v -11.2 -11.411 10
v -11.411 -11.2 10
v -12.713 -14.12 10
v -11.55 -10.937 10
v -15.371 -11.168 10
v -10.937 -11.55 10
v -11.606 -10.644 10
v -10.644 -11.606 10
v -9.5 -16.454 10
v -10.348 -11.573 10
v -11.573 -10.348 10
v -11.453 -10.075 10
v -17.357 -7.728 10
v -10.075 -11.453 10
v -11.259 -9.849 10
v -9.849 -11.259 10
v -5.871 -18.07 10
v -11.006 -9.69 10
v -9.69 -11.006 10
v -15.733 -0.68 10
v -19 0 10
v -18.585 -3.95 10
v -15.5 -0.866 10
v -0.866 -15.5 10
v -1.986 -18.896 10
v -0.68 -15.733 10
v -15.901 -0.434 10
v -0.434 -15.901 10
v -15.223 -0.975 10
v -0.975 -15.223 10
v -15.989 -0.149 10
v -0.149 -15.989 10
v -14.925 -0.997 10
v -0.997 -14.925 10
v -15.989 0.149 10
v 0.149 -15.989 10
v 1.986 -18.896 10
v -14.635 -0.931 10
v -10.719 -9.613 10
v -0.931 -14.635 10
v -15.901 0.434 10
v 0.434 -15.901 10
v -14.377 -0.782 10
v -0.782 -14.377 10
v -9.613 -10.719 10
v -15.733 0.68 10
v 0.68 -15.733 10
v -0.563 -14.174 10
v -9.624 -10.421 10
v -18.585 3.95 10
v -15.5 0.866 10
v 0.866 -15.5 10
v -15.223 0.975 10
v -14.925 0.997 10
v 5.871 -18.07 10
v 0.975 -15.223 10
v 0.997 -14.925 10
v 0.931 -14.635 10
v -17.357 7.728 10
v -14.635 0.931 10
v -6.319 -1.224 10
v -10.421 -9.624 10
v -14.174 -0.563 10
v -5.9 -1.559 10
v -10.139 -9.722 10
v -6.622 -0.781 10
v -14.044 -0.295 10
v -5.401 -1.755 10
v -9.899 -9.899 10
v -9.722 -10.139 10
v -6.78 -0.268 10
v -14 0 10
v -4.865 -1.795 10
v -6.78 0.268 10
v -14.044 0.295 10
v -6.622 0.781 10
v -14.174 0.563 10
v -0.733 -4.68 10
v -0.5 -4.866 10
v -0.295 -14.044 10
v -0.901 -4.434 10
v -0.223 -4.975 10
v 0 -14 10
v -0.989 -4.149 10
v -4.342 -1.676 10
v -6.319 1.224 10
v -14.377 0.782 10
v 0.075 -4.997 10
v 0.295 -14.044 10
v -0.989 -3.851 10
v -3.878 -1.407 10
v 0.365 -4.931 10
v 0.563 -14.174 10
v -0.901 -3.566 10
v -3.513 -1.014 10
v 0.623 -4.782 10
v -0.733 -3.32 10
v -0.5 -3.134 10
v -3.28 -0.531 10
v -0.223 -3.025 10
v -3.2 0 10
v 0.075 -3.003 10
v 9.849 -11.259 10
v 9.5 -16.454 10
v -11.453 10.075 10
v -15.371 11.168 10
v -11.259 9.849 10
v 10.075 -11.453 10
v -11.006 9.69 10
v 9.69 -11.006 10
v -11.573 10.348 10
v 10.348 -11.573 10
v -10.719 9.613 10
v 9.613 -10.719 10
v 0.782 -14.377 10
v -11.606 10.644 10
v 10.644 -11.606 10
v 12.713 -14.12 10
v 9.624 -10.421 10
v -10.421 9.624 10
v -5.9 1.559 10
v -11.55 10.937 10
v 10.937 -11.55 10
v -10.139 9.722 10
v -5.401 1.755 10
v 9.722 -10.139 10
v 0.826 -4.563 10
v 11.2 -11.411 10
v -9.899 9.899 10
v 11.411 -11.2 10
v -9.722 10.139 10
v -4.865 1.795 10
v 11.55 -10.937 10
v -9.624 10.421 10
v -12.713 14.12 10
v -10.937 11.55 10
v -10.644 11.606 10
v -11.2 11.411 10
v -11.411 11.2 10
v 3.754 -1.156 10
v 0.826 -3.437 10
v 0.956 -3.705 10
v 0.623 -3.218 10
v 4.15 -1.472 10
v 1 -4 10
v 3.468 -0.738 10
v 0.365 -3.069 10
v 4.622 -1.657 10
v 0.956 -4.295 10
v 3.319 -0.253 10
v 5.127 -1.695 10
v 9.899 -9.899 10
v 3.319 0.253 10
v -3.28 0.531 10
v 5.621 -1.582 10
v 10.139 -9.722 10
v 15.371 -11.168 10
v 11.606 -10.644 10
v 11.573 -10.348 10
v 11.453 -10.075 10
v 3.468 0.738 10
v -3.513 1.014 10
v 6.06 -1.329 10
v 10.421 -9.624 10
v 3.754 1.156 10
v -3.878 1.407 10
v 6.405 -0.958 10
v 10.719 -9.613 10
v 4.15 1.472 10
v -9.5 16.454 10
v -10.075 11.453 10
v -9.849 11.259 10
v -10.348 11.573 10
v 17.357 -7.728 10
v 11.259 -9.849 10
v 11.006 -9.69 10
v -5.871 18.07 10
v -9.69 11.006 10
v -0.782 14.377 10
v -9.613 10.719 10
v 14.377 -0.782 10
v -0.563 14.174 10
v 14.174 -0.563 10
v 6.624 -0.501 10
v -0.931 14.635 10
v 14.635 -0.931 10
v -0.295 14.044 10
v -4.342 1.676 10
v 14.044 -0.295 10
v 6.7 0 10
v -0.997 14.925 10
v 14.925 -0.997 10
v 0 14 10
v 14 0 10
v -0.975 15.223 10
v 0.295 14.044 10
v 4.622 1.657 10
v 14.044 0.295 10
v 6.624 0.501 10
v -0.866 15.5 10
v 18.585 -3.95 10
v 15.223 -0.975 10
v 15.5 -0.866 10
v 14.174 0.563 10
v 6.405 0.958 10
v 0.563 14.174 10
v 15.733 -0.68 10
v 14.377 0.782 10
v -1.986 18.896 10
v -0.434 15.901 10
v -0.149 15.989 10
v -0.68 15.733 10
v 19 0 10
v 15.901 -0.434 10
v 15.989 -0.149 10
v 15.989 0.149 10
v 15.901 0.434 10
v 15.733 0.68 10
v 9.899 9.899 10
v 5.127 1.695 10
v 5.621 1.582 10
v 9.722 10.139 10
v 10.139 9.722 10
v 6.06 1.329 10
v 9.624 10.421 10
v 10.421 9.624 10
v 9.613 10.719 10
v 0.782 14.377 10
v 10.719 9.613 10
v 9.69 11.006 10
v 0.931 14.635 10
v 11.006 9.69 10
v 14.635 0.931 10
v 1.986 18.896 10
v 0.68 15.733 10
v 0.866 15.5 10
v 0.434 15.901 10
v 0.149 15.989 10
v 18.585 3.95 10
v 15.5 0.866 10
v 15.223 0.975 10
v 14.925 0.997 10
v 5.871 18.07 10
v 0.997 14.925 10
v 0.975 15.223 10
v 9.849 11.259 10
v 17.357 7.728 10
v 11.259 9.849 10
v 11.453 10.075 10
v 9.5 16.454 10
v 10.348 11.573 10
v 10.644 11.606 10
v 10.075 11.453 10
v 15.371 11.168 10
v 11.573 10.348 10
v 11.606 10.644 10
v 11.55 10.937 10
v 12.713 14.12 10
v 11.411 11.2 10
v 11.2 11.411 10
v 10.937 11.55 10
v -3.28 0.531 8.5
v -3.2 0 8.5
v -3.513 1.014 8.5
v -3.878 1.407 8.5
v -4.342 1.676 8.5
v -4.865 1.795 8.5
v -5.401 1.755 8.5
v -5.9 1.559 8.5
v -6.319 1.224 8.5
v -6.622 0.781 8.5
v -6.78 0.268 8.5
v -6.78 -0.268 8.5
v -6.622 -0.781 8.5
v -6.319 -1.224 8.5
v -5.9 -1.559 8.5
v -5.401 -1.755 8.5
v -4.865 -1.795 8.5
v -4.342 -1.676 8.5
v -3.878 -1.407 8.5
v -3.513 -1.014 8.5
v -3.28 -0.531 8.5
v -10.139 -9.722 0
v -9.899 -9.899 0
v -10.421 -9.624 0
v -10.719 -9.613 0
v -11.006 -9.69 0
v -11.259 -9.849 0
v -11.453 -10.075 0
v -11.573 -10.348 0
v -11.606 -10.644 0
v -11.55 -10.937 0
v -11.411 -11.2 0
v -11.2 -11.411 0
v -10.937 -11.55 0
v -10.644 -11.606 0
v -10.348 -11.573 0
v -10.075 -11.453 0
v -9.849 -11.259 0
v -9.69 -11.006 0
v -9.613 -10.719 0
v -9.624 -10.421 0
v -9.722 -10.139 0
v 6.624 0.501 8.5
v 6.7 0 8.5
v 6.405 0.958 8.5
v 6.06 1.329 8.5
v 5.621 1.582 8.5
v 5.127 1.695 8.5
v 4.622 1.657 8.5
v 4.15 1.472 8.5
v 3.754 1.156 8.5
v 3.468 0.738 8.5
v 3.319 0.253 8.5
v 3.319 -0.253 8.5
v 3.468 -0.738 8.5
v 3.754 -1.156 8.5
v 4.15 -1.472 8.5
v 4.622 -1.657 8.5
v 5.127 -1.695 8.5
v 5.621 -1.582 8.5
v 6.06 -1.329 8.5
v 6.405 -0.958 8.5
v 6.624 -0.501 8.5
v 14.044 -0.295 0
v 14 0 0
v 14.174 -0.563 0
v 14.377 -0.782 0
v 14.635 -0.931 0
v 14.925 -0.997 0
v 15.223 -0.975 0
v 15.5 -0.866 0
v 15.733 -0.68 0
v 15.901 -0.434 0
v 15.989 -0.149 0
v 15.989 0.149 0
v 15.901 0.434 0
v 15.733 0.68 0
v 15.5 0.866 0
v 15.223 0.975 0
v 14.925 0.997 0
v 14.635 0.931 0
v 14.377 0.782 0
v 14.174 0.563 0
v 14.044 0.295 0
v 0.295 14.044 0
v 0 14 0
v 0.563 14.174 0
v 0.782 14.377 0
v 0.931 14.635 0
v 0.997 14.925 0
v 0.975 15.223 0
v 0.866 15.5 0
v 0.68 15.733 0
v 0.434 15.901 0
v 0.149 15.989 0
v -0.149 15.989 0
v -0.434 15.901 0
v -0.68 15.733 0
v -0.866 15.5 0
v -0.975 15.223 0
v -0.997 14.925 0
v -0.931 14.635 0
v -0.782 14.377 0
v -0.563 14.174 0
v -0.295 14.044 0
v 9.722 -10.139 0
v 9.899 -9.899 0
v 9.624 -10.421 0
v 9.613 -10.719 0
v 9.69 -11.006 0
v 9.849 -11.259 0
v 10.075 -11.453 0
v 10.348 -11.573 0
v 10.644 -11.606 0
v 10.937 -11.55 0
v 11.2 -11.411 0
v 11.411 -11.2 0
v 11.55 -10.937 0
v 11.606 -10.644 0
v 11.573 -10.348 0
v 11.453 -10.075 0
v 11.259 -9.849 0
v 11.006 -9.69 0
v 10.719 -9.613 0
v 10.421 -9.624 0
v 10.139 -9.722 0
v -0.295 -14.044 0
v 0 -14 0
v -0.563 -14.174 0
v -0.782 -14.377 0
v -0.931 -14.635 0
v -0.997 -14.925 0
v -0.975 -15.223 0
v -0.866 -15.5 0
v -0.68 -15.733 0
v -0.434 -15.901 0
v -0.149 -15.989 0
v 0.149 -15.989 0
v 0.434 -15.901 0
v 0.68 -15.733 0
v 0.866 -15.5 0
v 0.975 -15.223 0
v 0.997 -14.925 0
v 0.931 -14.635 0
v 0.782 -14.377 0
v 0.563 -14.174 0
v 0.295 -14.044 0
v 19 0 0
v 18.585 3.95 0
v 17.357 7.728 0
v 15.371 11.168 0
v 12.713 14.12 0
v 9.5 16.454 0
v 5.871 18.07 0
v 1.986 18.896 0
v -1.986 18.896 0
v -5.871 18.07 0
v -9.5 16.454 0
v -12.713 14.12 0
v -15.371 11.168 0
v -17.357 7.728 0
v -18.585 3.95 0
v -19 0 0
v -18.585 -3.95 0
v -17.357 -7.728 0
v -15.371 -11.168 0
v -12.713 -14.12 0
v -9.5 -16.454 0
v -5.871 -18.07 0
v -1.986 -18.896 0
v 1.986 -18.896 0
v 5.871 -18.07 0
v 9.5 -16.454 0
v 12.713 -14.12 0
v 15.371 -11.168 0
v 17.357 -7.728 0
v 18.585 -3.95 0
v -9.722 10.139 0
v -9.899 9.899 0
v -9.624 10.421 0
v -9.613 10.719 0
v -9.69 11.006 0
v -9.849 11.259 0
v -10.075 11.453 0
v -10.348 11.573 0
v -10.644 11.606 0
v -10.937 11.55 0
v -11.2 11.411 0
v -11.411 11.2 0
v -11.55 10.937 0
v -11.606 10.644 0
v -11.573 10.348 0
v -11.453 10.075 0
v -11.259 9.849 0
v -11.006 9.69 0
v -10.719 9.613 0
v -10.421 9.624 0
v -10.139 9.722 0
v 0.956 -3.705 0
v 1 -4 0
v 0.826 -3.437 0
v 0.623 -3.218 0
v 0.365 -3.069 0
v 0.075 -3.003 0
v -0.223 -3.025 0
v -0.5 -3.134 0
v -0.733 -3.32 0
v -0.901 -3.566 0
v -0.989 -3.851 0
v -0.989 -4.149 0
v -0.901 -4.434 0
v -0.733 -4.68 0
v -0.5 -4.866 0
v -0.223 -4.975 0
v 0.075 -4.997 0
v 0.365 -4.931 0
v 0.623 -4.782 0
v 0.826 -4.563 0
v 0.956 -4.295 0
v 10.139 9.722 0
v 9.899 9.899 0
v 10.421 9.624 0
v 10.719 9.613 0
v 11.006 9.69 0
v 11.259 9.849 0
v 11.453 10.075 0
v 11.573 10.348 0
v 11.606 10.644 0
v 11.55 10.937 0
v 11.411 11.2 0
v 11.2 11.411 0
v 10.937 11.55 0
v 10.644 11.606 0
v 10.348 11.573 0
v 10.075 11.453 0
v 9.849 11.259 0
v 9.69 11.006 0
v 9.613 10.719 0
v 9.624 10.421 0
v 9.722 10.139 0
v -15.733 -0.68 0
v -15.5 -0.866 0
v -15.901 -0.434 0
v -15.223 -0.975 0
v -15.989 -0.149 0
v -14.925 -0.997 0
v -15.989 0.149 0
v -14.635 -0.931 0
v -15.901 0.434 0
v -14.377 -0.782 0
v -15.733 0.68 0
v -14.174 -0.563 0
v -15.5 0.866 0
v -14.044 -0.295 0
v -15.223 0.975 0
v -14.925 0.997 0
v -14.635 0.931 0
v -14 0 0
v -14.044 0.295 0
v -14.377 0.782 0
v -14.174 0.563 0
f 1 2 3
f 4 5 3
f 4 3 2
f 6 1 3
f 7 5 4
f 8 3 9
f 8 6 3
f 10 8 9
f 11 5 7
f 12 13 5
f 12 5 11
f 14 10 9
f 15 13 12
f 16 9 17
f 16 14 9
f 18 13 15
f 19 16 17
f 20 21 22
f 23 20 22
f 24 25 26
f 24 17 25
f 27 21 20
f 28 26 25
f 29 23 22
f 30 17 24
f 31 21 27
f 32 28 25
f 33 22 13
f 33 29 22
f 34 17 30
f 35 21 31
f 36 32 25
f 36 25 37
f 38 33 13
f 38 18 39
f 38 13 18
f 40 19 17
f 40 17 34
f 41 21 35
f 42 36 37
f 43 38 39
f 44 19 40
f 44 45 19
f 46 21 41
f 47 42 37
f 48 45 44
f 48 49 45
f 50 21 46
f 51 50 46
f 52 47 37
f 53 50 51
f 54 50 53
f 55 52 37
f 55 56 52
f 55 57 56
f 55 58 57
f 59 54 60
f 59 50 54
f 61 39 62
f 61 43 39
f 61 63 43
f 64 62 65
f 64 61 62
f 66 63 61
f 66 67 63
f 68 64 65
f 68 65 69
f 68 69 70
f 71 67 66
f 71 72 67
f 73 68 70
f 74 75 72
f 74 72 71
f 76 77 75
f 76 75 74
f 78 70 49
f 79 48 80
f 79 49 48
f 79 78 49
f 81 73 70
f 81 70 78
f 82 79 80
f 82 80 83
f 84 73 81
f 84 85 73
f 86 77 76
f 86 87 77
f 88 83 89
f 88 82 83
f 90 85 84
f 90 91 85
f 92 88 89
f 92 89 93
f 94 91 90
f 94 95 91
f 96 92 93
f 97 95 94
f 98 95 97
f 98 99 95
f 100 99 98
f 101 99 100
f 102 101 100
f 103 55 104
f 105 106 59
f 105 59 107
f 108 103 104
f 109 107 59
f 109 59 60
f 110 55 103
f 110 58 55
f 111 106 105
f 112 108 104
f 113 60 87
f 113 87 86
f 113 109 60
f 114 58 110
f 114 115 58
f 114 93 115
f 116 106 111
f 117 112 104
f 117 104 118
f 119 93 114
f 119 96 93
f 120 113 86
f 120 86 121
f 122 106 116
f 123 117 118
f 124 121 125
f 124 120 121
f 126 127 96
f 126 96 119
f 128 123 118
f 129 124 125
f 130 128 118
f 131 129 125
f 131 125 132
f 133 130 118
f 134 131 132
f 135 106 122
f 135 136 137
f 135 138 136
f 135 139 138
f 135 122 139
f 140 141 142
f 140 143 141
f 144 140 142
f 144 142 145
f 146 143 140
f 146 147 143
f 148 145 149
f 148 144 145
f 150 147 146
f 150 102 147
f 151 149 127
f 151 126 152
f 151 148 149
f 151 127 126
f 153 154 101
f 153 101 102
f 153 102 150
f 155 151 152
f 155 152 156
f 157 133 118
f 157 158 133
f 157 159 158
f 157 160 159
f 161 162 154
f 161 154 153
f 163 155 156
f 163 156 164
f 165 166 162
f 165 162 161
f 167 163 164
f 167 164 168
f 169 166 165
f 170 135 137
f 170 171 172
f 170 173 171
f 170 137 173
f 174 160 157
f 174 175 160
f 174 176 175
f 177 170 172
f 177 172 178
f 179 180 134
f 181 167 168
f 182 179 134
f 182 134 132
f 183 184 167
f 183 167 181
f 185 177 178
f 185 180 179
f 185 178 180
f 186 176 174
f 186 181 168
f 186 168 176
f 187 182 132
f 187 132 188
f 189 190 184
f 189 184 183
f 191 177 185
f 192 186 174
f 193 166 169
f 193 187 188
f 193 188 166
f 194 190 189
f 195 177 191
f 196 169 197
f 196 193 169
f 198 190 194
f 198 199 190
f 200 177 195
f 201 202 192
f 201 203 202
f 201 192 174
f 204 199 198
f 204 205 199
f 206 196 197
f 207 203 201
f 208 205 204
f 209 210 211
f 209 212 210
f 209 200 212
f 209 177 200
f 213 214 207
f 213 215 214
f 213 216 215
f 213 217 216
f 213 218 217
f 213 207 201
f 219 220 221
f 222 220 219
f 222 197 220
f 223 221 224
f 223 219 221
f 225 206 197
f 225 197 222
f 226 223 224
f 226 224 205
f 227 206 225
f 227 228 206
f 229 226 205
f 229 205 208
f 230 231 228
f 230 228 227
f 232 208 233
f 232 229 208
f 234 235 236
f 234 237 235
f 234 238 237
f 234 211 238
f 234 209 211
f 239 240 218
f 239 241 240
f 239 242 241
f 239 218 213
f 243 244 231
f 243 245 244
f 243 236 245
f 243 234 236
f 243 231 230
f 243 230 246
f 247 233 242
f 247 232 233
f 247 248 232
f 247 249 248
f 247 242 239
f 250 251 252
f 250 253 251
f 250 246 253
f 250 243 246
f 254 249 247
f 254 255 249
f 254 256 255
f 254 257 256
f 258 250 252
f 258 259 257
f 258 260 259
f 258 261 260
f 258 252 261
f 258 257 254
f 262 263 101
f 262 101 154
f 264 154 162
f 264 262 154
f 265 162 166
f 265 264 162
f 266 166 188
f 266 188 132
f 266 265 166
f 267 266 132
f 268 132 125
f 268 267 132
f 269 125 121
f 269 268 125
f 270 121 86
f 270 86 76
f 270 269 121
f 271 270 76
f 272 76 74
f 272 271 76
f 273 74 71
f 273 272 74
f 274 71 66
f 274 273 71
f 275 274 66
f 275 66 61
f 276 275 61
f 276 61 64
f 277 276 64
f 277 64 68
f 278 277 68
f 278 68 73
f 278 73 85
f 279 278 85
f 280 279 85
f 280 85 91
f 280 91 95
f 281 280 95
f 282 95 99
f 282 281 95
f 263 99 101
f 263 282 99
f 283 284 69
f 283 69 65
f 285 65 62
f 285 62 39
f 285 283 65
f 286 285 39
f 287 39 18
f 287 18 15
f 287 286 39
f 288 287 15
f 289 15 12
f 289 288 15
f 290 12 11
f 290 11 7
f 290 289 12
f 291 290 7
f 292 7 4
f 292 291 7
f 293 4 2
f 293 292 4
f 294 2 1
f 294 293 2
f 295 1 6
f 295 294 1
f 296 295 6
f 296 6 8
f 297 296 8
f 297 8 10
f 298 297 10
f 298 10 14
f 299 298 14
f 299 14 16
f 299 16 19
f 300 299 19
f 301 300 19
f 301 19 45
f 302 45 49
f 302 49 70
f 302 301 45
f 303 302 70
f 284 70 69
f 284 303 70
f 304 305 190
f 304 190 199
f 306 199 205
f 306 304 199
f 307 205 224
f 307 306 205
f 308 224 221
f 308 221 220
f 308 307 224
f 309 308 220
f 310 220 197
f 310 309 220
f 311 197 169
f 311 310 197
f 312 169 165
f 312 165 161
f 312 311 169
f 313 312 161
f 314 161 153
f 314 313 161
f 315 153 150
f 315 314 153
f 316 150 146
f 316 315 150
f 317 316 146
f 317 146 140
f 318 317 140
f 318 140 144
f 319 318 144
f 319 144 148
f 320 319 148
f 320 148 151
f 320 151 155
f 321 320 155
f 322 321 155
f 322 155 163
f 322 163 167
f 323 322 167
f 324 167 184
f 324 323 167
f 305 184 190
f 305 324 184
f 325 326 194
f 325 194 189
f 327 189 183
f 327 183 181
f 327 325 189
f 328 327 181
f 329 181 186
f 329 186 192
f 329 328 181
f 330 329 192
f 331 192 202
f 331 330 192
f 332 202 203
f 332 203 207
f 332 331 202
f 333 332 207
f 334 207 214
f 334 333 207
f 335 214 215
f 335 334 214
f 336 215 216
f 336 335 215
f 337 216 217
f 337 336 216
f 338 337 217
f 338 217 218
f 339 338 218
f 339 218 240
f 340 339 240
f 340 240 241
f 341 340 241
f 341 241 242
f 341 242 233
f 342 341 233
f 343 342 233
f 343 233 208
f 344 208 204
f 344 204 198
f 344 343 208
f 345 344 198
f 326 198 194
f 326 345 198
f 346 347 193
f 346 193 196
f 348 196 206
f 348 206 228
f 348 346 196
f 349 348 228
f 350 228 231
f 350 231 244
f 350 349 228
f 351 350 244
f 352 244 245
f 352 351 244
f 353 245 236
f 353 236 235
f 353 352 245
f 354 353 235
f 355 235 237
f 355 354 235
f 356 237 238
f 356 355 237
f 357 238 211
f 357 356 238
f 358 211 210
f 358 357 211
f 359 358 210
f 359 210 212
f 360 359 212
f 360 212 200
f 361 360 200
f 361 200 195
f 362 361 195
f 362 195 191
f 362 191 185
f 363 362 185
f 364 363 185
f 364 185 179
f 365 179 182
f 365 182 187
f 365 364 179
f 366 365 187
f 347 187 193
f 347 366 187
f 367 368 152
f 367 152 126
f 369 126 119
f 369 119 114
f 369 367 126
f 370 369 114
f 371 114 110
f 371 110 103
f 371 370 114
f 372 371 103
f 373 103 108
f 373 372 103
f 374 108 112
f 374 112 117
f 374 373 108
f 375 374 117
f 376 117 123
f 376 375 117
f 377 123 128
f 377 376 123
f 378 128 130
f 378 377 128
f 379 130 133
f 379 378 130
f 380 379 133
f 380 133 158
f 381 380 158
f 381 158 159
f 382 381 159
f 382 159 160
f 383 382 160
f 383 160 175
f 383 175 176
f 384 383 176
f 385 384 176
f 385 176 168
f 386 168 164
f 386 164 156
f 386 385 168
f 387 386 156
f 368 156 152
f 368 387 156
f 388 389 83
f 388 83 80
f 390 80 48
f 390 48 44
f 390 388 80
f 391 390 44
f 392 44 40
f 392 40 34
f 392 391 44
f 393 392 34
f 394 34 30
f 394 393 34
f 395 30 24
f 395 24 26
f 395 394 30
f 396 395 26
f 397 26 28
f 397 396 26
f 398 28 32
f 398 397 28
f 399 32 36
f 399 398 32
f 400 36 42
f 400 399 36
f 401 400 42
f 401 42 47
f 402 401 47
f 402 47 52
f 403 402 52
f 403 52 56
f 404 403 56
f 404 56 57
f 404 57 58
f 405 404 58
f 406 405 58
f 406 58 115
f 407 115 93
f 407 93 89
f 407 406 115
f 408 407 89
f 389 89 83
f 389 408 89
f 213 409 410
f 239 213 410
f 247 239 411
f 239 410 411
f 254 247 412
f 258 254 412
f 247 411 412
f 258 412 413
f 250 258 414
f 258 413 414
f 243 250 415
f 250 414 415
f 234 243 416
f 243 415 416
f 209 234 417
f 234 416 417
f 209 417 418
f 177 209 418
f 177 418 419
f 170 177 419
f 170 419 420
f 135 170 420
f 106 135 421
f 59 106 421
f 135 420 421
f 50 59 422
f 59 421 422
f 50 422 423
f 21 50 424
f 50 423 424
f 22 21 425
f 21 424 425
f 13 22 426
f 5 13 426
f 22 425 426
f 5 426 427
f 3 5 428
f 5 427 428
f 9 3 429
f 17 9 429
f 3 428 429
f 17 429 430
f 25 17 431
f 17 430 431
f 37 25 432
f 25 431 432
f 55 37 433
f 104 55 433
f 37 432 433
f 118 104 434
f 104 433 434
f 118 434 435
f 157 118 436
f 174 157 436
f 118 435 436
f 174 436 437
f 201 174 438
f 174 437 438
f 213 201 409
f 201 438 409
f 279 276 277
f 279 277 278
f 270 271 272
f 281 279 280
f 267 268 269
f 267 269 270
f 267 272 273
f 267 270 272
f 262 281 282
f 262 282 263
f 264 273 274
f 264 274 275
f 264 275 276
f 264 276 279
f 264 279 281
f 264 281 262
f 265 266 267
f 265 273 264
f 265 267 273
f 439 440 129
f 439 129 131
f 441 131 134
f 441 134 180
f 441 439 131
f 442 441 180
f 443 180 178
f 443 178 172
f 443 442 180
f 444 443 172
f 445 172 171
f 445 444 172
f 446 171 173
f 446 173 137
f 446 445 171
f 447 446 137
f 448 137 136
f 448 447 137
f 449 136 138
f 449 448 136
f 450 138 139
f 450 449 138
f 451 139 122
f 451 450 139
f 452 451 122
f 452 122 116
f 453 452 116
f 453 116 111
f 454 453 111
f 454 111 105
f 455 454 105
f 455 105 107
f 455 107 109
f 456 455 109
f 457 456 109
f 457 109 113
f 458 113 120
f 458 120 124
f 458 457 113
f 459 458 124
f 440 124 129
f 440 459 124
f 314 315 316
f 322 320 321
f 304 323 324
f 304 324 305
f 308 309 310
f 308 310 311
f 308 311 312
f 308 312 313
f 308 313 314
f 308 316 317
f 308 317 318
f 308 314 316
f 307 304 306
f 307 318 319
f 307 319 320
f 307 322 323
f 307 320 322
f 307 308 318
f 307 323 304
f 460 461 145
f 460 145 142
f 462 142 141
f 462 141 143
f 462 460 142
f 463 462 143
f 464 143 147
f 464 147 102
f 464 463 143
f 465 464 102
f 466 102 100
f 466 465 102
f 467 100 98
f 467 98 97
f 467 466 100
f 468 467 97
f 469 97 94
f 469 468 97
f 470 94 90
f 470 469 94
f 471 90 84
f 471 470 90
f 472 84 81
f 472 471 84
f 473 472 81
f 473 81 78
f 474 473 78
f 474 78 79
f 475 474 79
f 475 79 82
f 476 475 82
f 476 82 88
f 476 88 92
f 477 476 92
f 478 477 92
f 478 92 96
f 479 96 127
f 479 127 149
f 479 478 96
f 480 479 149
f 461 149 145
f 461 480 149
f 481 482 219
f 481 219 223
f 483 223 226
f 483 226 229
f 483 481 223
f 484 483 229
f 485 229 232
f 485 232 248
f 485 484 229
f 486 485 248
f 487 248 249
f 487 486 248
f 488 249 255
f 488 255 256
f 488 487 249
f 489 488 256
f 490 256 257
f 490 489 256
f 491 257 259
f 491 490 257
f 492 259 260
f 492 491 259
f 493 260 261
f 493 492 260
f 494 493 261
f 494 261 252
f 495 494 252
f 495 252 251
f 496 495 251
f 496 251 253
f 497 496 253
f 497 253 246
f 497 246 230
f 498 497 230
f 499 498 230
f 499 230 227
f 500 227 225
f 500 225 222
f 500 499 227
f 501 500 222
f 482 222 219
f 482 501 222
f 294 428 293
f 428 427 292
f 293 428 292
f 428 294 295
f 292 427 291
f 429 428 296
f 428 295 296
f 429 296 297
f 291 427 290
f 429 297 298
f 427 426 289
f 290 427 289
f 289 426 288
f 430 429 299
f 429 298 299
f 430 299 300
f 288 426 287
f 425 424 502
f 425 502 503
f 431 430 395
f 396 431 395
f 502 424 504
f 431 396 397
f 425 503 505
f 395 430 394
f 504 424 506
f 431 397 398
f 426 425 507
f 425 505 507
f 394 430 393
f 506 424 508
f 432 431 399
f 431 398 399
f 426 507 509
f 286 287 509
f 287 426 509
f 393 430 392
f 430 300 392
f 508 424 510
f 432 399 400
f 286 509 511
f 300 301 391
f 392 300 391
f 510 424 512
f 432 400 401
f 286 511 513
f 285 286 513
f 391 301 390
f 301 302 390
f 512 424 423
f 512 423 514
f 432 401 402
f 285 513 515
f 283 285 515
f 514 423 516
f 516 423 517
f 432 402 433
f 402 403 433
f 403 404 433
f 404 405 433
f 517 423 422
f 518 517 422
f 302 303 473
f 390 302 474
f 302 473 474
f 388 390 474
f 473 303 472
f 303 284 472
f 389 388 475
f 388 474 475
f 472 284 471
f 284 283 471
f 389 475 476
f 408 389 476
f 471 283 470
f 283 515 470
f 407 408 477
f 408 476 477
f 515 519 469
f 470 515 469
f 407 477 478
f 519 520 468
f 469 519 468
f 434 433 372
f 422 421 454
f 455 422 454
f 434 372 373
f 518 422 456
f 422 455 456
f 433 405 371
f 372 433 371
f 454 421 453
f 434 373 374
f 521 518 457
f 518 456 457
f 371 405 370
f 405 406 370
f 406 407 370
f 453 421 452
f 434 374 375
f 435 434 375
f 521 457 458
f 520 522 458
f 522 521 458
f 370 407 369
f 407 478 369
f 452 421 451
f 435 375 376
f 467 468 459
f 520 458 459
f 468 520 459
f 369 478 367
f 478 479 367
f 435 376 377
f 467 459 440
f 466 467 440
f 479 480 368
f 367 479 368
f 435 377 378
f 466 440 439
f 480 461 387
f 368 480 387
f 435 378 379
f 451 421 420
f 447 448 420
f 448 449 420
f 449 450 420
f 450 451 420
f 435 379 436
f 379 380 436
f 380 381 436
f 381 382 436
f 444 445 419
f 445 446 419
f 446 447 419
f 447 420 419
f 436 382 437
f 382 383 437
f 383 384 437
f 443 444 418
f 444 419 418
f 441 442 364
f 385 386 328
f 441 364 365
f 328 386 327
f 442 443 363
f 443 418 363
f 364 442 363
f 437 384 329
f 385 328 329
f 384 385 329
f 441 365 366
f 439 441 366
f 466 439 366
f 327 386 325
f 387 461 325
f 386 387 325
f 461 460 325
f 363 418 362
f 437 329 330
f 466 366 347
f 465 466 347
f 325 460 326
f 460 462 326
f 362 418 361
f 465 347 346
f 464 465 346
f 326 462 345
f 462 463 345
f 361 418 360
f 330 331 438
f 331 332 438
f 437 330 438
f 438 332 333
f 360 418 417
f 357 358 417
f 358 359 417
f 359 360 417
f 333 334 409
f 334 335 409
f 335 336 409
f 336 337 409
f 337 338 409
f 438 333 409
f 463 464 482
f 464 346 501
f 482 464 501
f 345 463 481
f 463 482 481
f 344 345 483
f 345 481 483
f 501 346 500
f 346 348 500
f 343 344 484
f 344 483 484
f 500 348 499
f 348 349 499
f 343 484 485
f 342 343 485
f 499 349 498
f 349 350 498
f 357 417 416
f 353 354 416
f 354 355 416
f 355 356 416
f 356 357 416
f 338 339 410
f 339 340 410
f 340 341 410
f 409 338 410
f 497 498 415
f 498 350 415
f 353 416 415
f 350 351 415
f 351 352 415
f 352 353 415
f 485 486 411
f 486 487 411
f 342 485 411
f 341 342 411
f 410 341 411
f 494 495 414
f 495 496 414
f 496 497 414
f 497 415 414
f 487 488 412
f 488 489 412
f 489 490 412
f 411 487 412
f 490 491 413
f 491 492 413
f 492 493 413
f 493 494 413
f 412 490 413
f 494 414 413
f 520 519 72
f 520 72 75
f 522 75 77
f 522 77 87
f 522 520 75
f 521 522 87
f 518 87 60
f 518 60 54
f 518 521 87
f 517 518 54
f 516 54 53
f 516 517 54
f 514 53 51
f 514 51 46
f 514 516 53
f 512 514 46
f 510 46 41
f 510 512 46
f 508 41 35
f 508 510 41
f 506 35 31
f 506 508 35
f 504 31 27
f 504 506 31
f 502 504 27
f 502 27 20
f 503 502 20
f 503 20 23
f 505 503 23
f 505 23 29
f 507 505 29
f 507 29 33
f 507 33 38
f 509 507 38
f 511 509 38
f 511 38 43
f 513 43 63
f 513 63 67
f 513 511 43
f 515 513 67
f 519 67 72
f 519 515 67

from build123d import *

# Parameters (mm, degrees)
CYLINDER003_R     = 1
CYLINDER003_DEPTH = 10
ARRAY_COUNT       = 8
CYLINDER002_R     = 1.8
CYLINDER002_DEPTH = 1.5
CYLINDER001_R     = 1.7
CYLINDER001_DEPTH = 1.5
CYLINDER004_R     = 1
CYLINDER004_DEPTH = 10
CYLINDER_R        = 19
CYLINDER_DEPTH    = 10


with BuildPart() as array:
    # Cylinder003 → Cylinder003 (new body)
    with BuildSketch(Plane(origin=(-15, 0, 0), x_dir=(1, 0, 0), z_dir=(0, 0, 1))):
        Circle(CYLINDER003_R)
    extrude(amount=CYLINDER003_DEPTH)

    # Array: Array ×8 about axis
    array_axis = Axis((0, 0, 0), (0, 0, 1))


with BuildPart() as array_1:
    add(array.part)
    for i in range(1, ARRAY_COUNT):
        add(array.part.rotate(array_axis, i * 360 / ARRAY_COUNT))


with BuildPart() as recess1:
    # Cylinder002 → Cylinder002 (new body)
    with BuildSketch(Plane(origin=(-5, 0, 8.5), x_dir=(1, 0, 0), z_dir=(0, 0, 1))):
        Circle(CYLINDER002_R)
    extrude(amount=CYLINDER002_DEPTH)


with BuildPart() as recess2:
    # Cylinder001 → Cylinder001 (new body)
    with BuildSketch(Plane(origin=(5, 0, 8.5), x_dir=(1, 0, 0), z_dir=(0, 0, 1))):
        Circle(CYLINDER001_R)
    extrude(amount=CYLINDER001_DEPTH)


with BuildPart() as fusion:
    # Cylinder004 → Cylinder004 (new body)
    with BuildSketch(Plane(origin=(0, -4, 0), x_dir=(1, 0, 0), z_dir=(0, 0, 1))):
        Circle(CYLINDER004_R)
    extrude(amount=CYLINDER004_DEPTH)

    # Fusion: union Array, Recess1, Recess2
    add(array_1.part)
    add(recess1.part)
    add(recess2.part)


with BuildPart() as cut:
    # Cylinder → Cylinder (new body)
    with BuildSketch(Plane.XY):
        Circle(CYLINDER_R)
    extrude(amount=CYLINDER_DEPTH)

    # Cut: cut Fusion
    add(fusion.part, mode=Mode.SUBTRACT)


solid = cut.part
